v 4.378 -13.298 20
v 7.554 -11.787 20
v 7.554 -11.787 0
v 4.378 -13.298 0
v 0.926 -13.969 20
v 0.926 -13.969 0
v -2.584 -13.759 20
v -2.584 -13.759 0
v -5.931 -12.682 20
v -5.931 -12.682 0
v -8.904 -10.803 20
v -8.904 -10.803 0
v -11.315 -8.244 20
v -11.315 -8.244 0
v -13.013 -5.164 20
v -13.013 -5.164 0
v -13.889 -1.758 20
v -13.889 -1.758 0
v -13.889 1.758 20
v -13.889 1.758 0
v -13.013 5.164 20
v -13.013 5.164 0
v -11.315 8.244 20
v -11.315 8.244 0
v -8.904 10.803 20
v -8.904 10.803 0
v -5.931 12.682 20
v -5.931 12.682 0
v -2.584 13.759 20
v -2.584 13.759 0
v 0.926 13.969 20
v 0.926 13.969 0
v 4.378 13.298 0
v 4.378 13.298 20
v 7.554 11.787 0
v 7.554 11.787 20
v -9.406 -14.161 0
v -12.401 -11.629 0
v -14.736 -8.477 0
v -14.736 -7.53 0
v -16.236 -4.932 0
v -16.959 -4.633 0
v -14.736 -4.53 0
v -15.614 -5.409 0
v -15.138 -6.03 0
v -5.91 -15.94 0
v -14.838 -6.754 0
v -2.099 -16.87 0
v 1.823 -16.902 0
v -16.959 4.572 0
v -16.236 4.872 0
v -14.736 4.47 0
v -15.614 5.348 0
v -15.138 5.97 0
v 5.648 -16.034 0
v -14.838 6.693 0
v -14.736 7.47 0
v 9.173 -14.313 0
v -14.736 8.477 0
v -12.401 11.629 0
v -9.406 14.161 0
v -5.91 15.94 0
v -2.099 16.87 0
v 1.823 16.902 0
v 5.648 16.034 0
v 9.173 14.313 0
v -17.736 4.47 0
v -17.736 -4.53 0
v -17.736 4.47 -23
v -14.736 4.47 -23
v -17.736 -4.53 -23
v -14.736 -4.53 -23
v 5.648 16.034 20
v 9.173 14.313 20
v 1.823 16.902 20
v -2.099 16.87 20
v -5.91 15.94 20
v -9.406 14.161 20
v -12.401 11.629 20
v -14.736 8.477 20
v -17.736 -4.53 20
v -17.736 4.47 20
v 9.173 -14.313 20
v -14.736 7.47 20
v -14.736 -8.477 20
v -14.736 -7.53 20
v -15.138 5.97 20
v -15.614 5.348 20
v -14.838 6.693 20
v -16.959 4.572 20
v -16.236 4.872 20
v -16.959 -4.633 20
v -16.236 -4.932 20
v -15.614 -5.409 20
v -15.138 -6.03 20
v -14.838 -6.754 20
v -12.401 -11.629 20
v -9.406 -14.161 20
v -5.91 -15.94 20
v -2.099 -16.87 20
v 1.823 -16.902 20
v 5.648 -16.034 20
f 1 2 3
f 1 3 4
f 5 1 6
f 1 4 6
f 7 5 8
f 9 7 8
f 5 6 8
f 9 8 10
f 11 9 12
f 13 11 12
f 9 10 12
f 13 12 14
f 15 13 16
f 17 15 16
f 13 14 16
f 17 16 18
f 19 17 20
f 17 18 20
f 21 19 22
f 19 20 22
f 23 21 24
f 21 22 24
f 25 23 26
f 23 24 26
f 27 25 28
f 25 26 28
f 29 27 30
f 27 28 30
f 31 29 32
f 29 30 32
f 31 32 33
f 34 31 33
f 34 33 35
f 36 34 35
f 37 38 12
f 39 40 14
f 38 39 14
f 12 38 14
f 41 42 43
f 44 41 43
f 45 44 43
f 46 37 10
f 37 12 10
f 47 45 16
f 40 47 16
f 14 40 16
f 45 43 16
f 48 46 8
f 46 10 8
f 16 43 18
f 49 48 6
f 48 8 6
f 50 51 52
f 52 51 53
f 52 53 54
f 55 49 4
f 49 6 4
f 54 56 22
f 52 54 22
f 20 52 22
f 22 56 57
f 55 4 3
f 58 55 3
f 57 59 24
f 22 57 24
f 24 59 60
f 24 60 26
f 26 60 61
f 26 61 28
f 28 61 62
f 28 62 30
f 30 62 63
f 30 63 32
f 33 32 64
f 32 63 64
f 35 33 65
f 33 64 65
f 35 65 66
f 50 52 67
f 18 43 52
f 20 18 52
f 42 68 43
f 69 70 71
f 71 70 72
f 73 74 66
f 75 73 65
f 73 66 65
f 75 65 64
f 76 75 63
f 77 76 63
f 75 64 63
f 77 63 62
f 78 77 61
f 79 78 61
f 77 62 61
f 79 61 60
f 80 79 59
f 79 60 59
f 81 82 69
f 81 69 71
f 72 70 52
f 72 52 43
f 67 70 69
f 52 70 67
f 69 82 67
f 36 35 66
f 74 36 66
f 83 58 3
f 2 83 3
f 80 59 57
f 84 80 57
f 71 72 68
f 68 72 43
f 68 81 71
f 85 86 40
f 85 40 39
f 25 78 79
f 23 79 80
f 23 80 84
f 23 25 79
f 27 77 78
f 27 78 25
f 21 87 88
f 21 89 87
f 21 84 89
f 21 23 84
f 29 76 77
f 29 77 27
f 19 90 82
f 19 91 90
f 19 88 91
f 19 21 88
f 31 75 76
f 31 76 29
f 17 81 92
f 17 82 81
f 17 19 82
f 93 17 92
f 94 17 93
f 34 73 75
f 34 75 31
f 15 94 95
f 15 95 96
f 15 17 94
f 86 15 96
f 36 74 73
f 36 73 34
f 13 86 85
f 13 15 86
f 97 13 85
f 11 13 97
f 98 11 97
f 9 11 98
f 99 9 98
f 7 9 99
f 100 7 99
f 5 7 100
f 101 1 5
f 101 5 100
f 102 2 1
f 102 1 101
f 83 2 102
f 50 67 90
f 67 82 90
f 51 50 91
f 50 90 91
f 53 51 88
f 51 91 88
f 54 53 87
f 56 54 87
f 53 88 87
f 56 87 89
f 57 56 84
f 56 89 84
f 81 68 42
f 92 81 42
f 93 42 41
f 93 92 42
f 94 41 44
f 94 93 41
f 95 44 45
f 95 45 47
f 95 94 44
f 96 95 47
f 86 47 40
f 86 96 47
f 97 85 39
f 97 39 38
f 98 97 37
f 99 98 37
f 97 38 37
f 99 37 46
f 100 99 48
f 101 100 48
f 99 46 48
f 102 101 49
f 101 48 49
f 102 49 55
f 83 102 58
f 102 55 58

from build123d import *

# Parameters (mm, degrees)
F1_DEPTH = 20
F2_W     = 9
F2_H     = 43
F3_DEPTH = 3
F4_DEPTH = 3
F5_R     = 2.99999


# Not quite as in the source:
# - a fillet or chamfer is up to 0.001 mm smaller than in the source, because OpenCascade refuses the exact size
# - a feature names something its author has since deleted; it is built from what else it names


with BuildPart() as f1:
    # F0 (on Top) → F1 (new body)
    with BuildSketch(Plane.XY):
        with BuildLine():
            Line((7.553949271, 11.7871900982), (9.1726526862, 14.3130165478))
            ThreePointArc((9.1726526862, 14.3130165478), (-4.0313436719, 16.5150921341), (-14.7357025028, 8.4769730299))
            Line((-14.7357025028, 8.4769730299), (-14.7357025028, -8.4769730299))
            ThreePointArc((-14.7357025028, -8.4769730299), (-4.0313436719, -16.5150921341), (9.1726526862, -14.3130165478))
            Line((9.1726526862, -14.3130165478), (7.553949271, -11.7871900982))
            ThreePointArc((7.553949271, -11.7871900982), (-14, 0), (7.553949271, 11.7871900982))
        make_face()
    extrude(amount=F1_DEPTH)

    # F2 (on face) → F3 (join)
    with BuildSketch(Plane(origin=(-14.7357025028, 0, 0), x_dir=(0, -1, 0), z_dir=(-1, 0, 0))):
        with Locations((0.0303052693, -1.5)):
            Rectangle(F2_W, F2_H)
    extrude(amount=F3_DEPTH)

    # F2 (on face) → F4 (join)
    with BuildSketch(Plane(origin=(-14.7357025028, 0, 0), x_dir=(0, -1, 0), z_dir=(-1, 0, 0))):
        with Locations((0.0303052693, -1.5)):
            Rectangle(F2_W, F2_H)
    extrude(amount=F4_DEPTH)

    # F5 (radius 3 in the source; OpenCascade refuses exactly that, so slightly less here)
    f5_edges = [f1.edges().sort_by_distance(p)[0] for p in [
        (-14.735703, 4.469695, 10),
        (-14.735703, -4.530305, 10),
    ]]
    fillet(f5_edges, radius=F5_R)


solid = f1.part
